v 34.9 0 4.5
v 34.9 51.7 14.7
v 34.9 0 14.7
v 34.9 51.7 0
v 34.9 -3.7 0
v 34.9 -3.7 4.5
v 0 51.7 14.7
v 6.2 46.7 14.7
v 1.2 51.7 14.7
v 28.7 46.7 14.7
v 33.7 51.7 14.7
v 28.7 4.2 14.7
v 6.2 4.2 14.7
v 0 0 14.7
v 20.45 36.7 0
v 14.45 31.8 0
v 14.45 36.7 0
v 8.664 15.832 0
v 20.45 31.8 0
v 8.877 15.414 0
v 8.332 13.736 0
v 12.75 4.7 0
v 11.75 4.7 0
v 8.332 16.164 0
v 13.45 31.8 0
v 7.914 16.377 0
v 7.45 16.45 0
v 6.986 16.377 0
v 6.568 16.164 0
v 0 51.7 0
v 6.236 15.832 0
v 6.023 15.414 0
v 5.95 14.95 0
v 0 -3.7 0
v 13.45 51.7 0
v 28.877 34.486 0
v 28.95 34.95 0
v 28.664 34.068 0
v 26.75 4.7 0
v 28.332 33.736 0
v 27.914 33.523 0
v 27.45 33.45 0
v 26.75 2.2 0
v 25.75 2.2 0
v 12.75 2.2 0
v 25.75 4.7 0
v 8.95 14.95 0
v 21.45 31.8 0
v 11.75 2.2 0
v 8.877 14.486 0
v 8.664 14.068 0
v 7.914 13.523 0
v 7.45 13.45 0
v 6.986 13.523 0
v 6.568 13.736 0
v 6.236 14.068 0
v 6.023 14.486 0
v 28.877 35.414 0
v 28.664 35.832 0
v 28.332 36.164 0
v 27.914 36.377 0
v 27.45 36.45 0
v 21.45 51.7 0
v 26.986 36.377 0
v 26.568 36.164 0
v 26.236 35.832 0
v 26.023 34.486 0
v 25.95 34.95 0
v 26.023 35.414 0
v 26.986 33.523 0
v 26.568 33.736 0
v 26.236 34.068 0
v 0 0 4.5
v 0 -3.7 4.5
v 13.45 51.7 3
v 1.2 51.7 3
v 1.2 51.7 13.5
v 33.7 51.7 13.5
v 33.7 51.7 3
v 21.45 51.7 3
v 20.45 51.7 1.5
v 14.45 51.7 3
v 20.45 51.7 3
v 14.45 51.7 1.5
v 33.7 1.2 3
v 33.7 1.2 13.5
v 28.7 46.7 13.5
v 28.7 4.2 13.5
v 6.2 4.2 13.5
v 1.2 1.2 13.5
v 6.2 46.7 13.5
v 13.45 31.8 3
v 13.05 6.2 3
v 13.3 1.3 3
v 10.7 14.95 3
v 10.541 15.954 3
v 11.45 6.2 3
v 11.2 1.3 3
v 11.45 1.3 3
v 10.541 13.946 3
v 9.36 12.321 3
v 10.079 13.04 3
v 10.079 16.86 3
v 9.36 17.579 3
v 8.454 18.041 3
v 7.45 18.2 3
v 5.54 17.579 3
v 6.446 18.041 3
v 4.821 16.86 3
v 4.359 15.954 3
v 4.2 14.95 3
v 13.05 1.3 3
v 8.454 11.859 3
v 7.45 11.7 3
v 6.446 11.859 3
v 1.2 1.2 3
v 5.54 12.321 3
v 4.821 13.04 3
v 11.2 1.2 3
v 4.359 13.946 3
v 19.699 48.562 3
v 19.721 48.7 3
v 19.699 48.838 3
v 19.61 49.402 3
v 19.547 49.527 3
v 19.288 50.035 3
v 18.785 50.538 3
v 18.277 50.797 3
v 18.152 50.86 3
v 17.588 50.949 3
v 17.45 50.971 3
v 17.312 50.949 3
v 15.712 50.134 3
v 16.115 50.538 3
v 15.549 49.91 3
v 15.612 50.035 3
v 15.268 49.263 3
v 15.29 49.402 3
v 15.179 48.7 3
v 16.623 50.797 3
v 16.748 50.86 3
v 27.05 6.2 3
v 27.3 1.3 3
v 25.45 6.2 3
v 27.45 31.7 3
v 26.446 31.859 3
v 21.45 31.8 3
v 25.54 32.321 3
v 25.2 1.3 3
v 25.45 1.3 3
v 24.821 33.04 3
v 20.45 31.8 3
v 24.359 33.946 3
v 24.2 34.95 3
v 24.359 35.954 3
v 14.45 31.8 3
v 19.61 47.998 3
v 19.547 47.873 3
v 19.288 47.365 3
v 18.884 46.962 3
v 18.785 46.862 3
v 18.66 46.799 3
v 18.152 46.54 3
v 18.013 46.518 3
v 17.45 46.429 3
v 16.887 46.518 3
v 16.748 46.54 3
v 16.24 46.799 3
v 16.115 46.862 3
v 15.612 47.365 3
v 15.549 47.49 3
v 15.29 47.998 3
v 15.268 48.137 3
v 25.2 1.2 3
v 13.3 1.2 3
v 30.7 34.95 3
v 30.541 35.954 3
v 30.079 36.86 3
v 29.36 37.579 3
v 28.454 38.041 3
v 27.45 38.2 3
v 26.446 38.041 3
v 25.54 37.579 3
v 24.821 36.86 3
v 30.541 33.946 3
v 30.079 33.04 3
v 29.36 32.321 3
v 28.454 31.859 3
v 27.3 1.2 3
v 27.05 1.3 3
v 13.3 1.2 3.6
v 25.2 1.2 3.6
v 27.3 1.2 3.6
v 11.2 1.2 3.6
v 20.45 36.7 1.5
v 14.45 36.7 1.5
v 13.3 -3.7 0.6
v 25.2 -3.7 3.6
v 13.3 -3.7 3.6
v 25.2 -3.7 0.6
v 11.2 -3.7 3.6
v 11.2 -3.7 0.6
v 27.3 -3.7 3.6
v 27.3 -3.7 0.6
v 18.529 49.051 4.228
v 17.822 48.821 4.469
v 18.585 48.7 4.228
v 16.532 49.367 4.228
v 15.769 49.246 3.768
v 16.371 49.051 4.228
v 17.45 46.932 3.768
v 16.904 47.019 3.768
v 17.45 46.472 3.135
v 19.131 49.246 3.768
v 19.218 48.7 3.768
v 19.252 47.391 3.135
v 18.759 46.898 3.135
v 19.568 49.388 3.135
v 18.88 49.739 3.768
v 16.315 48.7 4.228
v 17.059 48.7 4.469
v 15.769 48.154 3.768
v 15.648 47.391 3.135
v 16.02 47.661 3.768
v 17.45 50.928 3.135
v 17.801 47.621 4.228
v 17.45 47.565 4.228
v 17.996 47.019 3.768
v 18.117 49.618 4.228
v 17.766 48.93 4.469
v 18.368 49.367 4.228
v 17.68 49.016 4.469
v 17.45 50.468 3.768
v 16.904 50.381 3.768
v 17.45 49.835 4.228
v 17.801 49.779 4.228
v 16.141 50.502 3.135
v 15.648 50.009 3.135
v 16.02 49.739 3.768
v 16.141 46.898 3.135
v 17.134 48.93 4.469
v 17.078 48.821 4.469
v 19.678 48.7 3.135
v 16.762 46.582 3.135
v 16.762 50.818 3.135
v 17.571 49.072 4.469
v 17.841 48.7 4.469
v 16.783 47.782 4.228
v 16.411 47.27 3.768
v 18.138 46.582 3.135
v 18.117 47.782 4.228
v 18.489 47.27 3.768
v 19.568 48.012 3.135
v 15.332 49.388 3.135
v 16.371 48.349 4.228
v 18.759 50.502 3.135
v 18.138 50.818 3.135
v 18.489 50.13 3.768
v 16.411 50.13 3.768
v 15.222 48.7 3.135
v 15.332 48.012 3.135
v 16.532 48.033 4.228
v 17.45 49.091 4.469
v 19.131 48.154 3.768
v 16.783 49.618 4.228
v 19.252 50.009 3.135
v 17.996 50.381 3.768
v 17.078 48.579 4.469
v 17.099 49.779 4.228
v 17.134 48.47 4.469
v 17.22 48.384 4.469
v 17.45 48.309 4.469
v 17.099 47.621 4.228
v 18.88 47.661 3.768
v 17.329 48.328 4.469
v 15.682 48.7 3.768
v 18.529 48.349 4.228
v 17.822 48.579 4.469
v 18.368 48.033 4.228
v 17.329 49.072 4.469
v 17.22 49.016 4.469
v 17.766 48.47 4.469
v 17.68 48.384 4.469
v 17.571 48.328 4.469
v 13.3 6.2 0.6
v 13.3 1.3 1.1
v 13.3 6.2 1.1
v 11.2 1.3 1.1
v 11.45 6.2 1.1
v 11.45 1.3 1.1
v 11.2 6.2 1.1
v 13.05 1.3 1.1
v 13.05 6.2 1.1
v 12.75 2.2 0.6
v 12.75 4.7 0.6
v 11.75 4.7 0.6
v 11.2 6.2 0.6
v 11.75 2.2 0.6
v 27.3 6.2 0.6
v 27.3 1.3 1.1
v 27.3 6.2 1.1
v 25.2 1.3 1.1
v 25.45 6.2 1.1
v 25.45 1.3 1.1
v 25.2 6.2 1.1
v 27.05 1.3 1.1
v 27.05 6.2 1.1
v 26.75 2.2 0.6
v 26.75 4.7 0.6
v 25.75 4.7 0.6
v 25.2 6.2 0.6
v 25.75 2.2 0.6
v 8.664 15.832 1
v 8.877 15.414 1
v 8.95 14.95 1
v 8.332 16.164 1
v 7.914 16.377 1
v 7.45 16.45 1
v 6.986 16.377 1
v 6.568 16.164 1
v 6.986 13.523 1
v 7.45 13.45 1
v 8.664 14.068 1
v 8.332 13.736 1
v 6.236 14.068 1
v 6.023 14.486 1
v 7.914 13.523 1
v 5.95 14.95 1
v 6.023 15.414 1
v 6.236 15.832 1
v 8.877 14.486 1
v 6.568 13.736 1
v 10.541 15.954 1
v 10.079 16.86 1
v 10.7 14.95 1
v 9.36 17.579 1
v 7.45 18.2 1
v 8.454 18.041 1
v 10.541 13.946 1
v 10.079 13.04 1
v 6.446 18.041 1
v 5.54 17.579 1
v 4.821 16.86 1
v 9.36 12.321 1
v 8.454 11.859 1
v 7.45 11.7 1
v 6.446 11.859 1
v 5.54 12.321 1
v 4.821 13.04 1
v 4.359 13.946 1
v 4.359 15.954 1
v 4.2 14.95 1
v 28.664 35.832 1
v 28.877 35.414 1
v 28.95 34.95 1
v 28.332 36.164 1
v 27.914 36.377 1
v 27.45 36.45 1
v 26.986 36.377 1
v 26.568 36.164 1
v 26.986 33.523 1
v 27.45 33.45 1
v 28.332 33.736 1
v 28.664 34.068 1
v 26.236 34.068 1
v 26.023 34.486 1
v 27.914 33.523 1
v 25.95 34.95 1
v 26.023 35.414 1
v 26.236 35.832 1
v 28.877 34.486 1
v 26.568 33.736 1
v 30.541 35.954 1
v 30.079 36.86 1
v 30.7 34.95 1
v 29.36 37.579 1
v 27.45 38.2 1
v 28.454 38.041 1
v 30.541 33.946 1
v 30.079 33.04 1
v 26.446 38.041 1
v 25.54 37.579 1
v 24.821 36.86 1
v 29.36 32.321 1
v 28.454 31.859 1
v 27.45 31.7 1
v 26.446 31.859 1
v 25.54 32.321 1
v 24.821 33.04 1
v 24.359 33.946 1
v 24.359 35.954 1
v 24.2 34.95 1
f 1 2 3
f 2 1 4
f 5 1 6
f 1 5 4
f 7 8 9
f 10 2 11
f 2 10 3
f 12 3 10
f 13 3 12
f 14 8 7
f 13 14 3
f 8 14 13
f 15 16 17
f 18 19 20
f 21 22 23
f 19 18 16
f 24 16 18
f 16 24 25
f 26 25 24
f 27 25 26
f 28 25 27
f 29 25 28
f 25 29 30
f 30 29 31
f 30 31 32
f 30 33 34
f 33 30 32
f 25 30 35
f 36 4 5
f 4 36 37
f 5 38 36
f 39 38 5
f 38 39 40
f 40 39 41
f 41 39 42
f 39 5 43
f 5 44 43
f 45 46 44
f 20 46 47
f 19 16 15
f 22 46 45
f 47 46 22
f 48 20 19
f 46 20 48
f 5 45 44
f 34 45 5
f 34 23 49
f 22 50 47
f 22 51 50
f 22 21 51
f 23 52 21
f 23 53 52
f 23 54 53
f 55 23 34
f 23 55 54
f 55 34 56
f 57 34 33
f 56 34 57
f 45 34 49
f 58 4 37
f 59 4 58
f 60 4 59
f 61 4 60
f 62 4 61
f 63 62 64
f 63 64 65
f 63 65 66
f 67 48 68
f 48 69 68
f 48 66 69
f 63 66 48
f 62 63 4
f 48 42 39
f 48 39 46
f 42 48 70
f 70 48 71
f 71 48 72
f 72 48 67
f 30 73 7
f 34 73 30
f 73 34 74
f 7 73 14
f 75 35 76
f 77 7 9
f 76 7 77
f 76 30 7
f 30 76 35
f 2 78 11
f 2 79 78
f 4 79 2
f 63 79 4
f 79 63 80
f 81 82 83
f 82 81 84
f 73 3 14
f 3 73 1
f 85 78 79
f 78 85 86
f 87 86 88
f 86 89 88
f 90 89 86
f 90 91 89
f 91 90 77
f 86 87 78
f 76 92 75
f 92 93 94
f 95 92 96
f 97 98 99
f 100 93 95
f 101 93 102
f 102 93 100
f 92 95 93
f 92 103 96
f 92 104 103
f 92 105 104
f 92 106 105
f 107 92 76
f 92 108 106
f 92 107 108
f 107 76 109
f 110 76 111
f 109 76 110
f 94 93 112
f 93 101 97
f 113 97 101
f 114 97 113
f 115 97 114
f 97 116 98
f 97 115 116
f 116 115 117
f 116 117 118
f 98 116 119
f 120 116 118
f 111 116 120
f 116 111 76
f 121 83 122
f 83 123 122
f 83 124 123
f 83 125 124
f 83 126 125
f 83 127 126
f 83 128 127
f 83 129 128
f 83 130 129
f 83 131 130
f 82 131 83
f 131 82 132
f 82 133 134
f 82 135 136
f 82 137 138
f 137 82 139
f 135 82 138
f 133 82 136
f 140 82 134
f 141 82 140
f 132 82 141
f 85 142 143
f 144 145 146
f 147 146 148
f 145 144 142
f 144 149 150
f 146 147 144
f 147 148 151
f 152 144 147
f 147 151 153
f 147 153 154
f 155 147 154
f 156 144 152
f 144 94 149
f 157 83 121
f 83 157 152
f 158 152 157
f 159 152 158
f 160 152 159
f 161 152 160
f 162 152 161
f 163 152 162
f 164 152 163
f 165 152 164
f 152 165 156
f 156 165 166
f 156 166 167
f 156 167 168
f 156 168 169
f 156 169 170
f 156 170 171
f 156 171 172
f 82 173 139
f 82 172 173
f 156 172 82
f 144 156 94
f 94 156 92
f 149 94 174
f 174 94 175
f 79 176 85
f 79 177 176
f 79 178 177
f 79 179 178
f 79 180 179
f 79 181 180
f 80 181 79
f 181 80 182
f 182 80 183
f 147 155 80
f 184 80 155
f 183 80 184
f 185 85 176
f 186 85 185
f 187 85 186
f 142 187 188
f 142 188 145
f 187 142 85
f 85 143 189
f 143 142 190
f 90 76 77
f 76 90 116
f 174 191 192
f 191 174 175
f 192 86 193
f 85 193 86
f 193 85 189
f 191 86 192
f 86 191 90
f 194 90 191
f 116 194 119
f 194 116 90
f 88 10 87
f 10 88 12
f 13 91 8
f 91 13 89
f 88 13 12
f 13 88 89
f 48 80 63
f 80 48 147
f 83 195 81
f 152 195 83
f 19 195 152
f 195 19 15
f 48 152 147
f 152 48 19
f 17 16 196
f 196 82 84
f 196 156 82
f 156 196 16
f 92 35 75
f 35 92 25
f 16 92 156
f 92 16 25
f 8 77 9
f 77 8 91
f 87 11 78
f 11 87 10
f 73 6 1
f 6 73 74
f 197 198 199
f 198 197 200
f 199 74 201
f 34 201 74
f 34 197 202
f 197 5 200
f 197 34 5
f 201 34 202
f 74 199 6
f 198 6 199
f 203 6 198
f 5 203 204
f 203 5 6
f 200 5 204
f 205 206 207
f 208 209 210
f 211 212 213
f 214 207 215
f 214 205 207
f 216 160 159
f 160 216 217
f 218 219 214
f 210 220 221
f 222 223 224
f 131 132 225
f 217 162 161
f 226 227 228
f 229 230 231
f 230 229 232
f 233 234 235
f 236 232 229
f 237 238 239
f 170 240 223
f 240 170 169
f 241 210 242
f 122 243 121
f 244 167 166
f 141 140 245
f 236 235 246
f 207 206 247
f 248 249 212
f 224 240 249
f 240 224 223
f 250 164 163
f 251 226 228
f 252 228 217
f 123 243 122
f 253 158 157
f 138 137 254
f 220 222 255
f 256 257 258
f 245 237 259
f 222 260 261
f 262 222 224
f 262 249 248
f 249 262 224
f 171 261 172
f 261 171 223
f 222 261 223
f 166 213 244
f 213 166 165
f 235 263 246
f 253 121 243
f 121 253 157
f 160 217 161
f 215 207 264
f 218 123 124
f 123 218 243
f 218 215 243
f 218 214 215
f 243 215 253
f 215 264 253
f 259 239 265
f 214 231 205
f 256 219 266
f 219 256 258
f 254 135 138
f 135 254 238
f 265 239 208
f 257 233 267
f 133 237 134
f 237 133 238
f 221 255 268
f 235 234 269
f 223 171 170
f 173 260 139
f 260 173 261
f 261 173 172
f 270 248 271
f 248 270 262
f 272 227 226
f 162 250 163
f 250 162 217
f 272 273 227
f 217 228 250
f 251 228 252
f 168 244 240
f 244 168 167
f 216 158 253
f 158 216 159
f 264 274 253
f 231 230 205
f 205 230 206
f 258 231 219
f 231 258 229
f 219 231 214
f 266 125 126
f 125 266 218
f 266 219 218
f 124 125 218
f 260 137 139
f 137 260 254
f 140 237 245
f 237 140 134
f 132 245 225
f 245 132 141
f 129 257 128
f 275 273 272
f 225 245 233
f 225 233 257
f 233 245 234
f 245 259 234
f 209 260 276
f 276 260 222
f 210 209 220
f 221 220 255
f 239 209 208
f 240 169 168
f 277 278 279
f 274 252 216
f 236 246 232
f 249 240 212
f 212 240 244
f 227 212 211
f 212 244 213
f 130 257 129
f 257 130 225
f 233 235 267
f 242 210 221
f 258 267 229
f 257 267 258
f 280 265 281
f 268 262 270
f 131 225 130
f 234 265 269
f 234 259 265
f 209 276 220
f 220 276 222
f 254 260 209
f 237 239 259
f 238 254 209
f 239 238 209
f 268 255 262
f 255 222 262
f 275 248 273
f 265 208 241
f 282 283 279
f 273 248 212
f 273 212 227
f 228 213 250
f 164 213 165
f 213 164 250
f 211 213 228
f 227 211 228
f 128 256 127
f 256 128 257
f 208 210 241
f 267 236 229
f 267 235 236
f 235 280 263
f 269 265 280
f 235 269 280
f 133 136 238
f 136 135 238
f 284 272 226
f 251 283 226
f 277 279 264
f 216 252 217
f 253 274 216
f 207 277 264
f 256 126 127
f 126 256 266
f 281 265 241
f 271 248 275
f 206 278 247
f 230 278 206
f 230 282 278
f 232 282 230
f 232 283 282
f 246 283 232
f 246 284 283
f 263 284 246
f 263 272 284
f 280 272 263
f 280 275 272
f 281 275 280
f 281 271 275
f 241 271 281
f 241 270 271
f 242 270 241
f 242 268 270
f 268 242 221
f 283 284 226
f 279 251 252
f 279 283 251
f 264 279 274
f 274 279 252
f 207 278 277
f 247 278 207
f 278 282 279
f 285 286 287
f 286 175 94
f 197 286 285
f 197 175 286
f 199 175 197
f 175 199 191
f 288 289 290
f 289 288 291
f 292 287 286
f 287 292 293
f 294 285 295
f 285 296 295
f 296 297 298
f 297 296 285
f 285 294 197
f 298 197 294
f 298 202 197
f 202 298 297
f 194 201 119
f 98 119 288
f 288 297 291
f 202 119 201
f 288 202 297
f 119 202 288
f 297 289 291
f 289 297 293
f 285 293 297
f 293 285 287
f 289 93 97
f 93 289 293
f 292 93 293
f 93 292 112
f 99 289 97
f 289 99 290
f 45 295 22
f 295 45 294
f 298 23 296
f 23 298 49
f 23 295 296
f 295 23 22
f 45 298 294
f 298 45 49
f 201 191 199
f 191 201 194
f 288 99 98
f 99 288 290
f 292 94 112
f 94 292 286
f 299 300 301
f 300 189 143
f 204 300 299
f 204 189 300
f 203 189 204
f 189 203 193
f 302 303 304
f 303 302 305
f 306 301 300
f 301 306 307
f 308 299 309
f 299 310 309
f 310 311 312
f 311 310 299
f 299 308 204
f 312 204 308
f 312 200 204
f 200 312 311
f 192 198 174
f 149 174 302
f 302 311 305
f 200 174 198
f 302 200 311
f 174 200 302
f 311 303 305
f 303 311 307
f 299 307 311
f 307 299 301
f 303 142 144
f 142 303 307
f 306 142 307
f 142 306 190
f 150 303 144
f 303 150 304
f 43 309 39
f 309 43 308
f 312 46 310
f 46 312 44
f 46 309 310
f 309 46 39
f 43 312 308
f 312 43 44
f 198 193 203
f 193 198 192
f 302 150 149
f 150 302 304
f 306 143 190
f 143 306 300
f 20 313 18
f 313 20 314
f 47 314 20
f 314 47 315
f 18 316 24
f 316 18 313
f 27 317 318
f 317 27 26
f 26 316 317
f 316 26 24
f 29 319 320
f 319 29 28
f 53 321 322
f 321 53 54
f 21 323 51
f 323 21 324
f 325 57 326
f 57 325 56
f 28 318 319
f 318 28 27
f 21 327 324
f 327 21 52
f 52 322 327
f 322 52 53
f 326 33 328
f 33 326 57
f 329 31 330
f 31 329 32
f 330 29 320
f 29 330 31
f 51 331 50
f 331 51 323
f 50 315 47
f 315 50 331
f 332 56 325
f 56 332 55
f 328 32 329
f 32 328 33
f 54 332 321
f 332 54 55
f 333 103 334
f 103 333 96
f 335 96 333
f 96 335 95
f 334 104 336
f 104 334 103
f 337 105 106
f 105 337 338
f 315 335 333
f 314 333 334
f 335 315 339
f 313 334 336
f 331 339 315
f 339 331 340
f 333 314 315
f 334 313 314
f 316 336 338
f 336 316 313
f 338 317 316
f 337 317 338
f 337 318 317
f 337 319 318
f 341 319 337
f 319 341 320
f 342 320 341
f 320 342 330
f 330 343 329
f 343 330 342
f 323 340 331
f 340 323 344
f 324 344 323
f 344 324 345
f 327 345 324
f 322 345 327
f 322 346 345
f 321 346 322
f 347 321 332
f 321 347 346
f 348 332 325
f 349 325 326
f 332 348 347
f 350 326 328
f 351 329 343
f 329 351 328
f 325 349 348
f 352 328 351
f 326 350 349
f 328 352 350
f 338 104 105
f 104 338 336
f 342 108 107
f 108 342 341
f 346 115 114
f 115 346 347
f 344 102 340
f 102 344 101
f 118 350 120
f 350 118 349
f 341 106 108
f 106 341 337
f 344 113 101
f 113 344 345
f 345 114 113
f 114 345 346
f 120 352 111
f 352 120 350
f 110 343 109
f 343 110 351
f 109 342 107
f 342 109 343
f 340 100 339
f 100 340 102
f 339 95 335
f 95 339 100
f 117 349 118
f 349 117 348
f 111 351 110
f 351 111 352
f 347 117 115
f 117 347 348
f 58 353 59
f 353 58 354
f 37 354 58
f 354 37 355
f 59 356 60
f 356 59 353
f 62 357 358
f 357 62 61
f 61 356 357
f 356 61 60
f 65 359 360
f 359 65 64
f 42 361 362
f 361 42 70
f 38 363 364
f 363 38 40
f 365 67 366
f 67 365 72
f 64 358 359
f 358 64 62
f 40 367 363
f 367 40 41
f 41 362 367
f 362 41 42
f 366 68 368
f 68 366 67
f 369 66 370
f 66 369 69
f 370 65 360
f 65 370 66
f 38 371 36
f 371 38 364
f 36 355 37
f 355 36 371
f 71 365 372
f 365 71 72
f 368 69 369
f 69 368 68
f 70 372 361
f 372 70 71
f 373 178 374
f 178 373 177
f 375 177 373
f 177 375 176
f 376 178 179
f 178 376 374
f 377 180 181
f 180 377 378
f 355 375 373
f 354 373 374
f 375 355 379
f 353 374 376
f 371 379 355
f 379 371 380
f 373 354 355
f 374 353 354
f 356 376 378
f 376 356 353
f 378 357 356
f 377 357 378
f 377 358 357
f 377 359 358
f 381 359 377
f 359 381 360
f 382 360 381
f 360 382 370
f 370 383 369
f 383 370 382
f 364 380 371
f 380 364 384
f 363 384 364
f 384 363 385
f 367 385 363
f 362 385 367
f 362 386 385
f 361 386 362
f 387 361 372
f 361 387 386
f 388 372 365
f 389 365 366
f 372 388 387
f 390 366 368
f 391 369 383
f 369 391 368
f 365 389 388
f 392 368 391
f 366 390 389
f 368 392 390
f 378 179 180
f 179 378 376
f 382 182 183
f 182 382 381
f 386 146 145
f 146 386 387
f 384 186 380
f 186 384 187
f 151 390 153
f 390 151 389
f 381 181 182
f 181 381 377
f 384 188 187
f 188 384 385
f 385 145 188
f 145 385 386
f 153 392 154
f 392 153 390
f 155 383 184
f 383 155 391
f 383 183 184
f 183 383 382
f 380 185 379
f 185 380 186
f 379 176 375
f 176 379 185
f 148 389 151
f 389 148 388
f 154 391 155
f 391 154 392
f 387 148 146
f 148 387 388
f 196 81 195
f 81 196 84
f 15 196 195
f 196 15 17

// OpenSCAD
//preview[view:north, tilt:top]

/* [Basic] */
//width of battery (x axis)
width = 32.5;
//depth of battery (y axis)
depth = 47.5;
//height of batter (z axis) 
height = 10.5;
//vertical walls and top holder 
wallThickness = 1.2;
//base horizontal wall thickness
baseThickness = 3; 
//additonal depth of adapter for battery lock
lockLength = 3;
//width of top horizontal battery holder frame 
holderWidth = 5;
//create contact cover (yes/no) 
contactCover = 1; //[0:No,1:Yes]
//contact 1 distance from left battery edge 
contact1Distance = 10;
//contact 2 distance from left battery edge 
contact2Distance = 24;
//create mount holes (yes/no) 
Holes = 1; //[0:No,1:Yes] 
holeDiameter = 3;
//diameter of top screw head
holeHeadDiameter = 6.5;
//height of top screw head 
holeHeadHeight = 2;
//hole distance at x axis (width) 
holeXDistance = 20;
//hole distance at y axis (depth) 
holeYDistance = 20; 

/* [Advanced] */
//contact depth in inner battery box (how much is sinked into)
contactDepth = 5;
//total contact lenght 
contactLength = 10;
//contact bottom width 
contactBWidth = 2.1;
//contact top width (exposed to battery) 
contactTWidth = 1.6;
//contact hole height, should be less than contact height 
contactHeight = 2.5;
//distance of contact lock from contact tip 
contactLockDist = 4; 

/* [Hidden] */
//Number of facets
$fn = 20;

difference() {
	battery_box();
	//contact1
	translate([contact1Distance + wallThickness,contactDepth + wallThickness - contactLength, baseThickness - contactHeight + 0.1]) {
		contact();
	}
	//contact2
	translate([contact2Distance + wallThickness,contactDepth + wallThickness - contactLength, baseThickness - contactHeight + 0.1]) {
		contact();
	}
	//lock spacer
	translate([width/2-2*wallThickness,depth+lockLength+wallThickness -15,-baseThickness+1.5]){
	cube([7,lockLength + 15,baseThickness]);
	}
	//mount holes
	if(Holes == 1) {
		translate([(width-holeXDistance)/2+wallThickness,(depth-holeYDistance)/2+wallThickness,0]) { screwHole();}
		translate([(width-holeXDistance)/2+wallThickness+holeXDistance,(depth-holeYDistance)/2+wallThickness+holeYDistance,0]) { screwHole();}

	}
}


module battery_box() {
	difference() {
		cube([width+2*wallThickness,depth+wallThickness+lockLength,height+wallThickness+baseThickness],false);
		translate([wallThickness,wallThickness,baseThickness]){
			cube([width,depth+lockLength+0.1,height]);
		}
		translate([wallThickness+holderWidth,wallThickness+lockLength,baseThickness]){
			cube([width-2*holderWidth,depth+0.1,height+wallThickness+0.1]);
		}
		translate([wallThickness+width/2+3,depth+wallThickness+lockLength-20+0.1,-0.1]){
			cube([1,20,baseThickness+0.2]);
		}
		translate([wallThickness+width/2-4,depth+wallThickness+lockLength-20+0.1,-0.1]){
			cube([1,20,baseThickness+0.2]);
		}
		//chamfer
		translate([width/2+wallThickness,depth+wallThickness+lockLength-width/2,baseThickness+height-0.1]){
			rotate([0,0,45]){
				cube([sqrt(pow(width+2*wallThickness,2)/2),sqrt(pow(width+2*wallThickness,2)/2),wallThickness+0.2]);
			}
		}
	
	}
	//contact cover
	if (contactCover == 1) {
		translate([0,wallThickness+contactDepth-contactLength+0.1,0]){
		cube([width+2*wallThickness,contactLength-wallThickness-contactDepth-0.1,baseThickness+1.5]);
		}
	}
	//lock stump
		translate([wallThickness+width/2,depth+wallThickness,baseThickness-1]){
			sphere(d=5);
	}
}

module contact() {

union() {	
		cube([contactBWidth,contactLength,0.5]);
		translate([(contactBWidth - contactTWidth)/2, contactLength - contactDepth,0]){
			cube([contactTWidth,contactDepth,contactHeight]);
		}
		cube([contactBWidth,contactLength- contactDepth,contactHeight]);
		translate([(contactBWidth - 1)/2,contactLength - contactLockDist,-5]){
			cube([1,2.5,5]);
		}
	
		translate([0, 0,0]){
			cube([contactBWidth,contactLength-contactDepth+0.1,3]);
		}

	}
}

module screwHole() {
	union() {
		translate([0, 0,-0.1]){
			cylinder(h=baseThickness+0.2, r=holeDiameter/2);
		}
		translate([0, 0,baseThickness - holeHeadHeight]){
			cylinder(h=holeHeadHeight+0.1, r=holeHeadDiameter/2);
		}
	}
}
